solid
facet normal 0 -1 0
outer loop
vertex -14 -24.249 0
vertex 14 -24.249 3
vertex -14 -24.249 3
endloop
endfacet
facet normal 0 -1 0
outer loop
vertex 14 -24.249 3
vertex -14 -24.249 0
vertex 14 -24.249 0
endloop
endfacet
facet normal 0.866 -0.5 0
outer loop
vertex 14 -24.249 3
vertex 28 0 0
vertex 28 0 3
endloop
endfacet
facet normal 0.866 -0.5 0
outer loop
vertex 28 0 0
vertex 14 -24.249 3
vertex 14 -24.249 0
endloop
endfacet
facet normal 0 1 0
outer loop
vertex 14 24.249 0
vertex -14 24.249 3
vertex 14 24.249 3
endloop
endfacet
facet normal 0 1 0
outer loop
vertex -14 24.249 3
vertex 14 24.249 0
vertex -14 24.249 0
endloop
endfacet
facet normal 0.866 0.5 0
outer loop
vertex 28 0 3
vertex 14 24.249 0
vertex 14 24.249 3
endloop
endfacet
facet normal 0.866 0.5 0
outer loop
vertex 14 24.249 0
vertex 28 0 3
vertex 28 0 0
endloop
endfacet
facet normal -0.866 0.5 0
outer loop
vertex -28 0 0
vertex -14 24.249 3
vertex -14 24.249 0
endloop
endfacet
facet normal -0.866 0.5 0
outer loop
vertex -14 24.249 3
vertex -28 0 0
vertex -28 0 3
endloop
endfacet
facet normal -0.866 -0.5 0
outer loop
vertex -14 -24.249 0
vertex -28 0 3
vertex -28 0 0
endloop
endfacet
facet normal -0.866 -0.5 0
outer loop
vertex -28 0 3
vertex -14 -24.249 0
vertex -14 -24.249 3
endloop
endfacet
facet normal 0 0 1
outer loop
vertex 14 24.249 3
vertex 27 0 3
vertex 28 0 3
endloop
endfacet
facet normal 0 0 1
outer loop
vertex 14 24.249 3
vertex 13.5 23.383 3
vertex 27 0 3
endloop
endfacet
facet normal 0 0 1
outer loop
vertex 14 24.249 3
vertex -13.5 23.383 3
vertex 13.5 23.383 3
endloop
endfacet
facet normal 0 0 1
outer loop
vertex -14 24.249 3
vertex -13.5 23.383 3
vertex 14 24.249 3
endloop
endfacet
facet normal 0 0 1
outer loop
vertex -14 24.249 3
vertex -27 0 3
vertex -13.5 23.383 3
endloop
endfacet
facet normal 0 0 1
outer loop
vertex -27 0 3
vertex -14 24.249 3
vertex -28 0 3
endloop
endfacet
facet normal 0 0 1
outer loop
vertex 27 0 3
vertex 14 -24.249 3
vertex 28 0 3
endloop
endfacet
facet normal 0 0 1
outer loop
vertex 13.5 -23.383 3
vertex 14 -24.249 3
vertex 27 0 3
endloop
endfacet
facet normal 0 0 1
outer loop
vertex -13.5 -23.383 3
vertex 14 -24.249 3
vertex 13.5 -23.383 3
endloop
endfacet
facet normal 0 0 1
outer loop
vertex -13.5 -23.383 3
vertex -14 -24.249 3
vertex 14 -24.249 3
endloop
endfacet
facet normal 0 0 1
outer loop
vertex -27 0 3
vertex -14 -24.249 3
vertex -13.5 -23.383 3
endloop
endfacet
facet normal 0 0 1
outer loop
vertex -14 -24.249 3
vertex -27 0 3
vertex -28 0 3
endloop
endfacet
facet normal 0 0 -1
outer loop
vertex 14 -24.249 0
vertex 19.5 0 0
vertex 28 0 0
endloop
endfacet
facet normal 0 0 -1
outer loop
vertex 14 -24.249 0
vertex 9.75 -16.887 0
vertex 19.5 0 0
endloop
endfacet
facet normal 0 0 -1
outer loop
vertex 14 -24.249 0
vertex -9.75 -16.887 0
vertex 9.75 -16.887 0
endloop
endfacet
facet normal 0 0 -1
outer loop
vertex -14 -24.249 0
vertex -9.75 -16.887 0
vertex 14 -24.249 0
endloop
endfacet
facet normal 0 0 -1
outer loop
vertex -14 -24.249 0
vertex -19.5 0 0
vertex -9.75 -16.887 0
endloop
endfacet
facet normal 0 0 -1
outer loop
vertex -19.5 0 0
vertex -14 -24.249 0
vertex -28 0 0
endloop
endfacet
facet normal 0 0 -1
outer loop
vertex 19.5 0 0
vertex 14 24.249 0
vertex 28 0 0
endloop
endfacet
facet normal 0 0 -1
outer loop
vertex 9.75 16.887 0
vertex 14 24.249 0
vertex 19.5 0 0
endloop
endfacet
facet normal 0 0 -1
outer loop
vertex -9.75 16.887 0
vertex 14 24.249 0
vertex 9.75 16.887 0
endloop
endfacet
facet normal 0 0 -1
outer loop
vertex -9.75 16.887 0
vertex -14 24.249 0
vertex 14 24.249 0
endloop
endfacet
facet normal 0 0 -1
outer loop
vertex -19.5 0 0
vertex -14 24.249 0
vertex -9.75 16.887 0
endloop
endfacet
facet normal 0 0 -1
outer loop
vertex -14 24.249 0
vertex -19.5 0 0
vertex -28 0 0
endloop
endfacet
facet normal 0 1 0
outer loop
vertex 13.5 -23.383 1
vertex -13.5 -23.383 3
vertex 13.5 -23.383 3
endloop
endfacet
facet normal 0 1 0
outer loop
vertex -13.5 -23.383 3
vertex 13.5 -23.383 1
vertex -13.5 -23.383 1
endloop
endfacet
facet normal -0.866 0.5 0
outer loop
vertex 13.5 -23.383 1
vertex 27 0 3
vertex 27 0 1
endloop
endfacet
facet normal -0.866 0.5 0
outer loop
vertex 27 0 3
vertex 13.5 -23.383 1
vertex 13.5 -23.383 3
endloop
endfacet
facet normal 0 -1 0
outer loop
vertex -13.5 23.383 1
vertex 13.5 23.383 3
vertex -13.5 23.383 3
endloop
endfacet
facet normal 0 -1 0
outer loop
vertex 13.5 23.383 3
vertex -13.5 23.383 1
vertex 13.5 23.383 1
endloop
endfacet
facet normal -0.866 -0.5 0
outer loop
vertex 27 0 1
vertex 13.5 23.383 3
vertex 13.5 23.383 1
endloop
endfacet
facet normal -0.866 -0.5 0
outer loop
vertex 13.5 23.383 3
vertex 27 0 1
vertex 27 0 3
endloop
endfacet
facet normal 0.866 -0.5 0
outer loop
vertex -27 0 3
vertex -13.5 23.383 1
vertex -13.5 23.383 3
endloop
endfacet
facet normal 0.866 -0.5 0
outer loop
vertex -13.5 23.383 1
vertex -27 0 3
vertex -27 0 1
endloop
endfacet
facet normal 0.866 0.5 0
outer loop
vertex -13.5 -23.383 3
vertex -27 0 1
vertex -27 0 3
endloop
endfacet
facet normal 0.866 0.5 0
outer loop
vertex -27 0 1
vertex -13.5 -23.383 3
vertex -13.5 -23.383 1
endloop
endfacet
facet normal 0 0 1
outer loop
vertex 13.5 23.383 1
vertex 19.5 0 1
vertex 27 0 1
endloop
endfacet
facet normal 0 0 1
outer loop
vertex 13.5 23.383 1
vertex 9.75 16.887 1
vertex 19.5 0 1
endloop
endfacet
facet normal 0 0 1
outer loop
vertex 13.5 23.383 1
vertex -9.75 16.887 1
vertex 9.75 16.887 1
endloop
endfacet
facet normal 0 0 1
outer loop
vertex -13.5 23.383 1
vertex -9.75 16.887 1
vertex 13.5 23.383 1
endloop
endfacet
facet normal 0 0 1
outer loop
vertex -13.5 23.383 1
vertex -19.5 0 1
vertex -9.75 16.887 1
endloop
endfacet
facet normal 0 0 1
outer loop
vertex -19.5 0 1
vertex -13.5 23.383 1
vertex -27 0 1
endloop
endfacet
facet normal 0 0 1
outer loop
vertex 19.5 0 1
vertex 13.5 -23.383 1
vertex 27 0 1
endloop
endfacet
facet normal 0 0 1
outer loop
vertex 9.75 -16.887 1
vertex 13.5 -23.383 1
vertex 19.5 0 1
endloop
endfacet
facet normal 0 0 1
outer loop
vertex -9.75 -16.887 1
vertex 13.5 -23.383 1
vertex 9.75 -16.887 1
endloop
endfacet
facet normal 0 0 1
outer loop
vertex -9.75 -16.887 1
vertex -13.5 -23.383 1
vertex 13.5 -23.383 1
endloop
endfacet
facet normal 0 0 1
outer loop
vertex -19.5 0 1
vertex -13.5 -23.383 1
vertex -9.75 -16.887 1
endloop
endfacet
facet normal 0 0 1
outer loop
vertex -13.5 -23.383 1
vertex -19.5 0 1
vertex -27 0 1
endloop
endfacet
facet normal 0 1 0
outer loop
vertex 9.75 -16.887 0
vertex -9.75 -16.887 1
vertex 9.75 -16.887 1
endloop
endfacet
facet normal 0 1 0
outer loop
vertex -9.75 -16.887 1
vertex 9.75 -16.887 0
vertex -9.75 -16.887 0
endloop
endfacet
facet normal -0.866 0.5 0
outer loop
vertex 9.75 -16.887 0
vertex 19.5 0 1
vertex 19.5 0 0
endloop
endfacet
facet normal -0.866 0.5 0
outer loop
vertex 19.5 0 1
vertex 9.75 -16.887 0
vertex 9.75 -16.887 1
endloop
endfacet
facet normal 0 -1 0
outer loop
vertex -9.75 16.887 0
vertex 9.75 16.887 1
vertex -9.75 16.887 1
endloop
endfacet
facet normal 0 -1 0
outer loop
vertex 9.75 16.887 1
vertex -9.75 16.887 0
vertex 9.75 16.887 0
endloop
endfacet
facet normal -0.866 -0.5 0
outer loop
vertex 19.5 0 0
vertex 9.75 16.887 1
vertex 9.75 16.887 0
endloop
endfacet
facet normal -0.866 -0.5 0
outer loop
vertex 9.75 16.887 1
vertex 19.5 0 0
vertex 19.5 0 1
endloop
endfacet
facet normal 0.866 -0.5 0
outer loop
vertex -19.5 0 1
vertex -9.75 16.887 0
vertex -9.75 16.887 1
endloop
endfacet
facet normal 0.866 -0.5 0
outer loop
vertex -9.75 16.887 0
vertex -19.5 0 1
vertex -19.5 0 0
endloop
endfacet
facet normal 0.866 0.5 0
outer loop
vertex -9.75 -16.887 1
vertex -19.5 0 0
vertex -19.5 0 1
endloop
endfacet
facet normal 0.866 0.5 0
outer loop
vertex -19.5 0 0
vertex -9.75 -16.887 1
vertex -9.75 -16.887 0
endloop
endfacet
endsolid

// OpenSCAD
$fn = 150;

difference() {
	cylinder($fn = 6, d = 56.0, h = 3.0);
	translate(v = [0, 0, 1.0]) {
		cylinder($fn = 6, d = 54.0, h = 3.0);
	}
	translate(v = [0, 0, -1]) {
		cylinder($fn = 6, d = 39, h = 3.0);
	}
}
